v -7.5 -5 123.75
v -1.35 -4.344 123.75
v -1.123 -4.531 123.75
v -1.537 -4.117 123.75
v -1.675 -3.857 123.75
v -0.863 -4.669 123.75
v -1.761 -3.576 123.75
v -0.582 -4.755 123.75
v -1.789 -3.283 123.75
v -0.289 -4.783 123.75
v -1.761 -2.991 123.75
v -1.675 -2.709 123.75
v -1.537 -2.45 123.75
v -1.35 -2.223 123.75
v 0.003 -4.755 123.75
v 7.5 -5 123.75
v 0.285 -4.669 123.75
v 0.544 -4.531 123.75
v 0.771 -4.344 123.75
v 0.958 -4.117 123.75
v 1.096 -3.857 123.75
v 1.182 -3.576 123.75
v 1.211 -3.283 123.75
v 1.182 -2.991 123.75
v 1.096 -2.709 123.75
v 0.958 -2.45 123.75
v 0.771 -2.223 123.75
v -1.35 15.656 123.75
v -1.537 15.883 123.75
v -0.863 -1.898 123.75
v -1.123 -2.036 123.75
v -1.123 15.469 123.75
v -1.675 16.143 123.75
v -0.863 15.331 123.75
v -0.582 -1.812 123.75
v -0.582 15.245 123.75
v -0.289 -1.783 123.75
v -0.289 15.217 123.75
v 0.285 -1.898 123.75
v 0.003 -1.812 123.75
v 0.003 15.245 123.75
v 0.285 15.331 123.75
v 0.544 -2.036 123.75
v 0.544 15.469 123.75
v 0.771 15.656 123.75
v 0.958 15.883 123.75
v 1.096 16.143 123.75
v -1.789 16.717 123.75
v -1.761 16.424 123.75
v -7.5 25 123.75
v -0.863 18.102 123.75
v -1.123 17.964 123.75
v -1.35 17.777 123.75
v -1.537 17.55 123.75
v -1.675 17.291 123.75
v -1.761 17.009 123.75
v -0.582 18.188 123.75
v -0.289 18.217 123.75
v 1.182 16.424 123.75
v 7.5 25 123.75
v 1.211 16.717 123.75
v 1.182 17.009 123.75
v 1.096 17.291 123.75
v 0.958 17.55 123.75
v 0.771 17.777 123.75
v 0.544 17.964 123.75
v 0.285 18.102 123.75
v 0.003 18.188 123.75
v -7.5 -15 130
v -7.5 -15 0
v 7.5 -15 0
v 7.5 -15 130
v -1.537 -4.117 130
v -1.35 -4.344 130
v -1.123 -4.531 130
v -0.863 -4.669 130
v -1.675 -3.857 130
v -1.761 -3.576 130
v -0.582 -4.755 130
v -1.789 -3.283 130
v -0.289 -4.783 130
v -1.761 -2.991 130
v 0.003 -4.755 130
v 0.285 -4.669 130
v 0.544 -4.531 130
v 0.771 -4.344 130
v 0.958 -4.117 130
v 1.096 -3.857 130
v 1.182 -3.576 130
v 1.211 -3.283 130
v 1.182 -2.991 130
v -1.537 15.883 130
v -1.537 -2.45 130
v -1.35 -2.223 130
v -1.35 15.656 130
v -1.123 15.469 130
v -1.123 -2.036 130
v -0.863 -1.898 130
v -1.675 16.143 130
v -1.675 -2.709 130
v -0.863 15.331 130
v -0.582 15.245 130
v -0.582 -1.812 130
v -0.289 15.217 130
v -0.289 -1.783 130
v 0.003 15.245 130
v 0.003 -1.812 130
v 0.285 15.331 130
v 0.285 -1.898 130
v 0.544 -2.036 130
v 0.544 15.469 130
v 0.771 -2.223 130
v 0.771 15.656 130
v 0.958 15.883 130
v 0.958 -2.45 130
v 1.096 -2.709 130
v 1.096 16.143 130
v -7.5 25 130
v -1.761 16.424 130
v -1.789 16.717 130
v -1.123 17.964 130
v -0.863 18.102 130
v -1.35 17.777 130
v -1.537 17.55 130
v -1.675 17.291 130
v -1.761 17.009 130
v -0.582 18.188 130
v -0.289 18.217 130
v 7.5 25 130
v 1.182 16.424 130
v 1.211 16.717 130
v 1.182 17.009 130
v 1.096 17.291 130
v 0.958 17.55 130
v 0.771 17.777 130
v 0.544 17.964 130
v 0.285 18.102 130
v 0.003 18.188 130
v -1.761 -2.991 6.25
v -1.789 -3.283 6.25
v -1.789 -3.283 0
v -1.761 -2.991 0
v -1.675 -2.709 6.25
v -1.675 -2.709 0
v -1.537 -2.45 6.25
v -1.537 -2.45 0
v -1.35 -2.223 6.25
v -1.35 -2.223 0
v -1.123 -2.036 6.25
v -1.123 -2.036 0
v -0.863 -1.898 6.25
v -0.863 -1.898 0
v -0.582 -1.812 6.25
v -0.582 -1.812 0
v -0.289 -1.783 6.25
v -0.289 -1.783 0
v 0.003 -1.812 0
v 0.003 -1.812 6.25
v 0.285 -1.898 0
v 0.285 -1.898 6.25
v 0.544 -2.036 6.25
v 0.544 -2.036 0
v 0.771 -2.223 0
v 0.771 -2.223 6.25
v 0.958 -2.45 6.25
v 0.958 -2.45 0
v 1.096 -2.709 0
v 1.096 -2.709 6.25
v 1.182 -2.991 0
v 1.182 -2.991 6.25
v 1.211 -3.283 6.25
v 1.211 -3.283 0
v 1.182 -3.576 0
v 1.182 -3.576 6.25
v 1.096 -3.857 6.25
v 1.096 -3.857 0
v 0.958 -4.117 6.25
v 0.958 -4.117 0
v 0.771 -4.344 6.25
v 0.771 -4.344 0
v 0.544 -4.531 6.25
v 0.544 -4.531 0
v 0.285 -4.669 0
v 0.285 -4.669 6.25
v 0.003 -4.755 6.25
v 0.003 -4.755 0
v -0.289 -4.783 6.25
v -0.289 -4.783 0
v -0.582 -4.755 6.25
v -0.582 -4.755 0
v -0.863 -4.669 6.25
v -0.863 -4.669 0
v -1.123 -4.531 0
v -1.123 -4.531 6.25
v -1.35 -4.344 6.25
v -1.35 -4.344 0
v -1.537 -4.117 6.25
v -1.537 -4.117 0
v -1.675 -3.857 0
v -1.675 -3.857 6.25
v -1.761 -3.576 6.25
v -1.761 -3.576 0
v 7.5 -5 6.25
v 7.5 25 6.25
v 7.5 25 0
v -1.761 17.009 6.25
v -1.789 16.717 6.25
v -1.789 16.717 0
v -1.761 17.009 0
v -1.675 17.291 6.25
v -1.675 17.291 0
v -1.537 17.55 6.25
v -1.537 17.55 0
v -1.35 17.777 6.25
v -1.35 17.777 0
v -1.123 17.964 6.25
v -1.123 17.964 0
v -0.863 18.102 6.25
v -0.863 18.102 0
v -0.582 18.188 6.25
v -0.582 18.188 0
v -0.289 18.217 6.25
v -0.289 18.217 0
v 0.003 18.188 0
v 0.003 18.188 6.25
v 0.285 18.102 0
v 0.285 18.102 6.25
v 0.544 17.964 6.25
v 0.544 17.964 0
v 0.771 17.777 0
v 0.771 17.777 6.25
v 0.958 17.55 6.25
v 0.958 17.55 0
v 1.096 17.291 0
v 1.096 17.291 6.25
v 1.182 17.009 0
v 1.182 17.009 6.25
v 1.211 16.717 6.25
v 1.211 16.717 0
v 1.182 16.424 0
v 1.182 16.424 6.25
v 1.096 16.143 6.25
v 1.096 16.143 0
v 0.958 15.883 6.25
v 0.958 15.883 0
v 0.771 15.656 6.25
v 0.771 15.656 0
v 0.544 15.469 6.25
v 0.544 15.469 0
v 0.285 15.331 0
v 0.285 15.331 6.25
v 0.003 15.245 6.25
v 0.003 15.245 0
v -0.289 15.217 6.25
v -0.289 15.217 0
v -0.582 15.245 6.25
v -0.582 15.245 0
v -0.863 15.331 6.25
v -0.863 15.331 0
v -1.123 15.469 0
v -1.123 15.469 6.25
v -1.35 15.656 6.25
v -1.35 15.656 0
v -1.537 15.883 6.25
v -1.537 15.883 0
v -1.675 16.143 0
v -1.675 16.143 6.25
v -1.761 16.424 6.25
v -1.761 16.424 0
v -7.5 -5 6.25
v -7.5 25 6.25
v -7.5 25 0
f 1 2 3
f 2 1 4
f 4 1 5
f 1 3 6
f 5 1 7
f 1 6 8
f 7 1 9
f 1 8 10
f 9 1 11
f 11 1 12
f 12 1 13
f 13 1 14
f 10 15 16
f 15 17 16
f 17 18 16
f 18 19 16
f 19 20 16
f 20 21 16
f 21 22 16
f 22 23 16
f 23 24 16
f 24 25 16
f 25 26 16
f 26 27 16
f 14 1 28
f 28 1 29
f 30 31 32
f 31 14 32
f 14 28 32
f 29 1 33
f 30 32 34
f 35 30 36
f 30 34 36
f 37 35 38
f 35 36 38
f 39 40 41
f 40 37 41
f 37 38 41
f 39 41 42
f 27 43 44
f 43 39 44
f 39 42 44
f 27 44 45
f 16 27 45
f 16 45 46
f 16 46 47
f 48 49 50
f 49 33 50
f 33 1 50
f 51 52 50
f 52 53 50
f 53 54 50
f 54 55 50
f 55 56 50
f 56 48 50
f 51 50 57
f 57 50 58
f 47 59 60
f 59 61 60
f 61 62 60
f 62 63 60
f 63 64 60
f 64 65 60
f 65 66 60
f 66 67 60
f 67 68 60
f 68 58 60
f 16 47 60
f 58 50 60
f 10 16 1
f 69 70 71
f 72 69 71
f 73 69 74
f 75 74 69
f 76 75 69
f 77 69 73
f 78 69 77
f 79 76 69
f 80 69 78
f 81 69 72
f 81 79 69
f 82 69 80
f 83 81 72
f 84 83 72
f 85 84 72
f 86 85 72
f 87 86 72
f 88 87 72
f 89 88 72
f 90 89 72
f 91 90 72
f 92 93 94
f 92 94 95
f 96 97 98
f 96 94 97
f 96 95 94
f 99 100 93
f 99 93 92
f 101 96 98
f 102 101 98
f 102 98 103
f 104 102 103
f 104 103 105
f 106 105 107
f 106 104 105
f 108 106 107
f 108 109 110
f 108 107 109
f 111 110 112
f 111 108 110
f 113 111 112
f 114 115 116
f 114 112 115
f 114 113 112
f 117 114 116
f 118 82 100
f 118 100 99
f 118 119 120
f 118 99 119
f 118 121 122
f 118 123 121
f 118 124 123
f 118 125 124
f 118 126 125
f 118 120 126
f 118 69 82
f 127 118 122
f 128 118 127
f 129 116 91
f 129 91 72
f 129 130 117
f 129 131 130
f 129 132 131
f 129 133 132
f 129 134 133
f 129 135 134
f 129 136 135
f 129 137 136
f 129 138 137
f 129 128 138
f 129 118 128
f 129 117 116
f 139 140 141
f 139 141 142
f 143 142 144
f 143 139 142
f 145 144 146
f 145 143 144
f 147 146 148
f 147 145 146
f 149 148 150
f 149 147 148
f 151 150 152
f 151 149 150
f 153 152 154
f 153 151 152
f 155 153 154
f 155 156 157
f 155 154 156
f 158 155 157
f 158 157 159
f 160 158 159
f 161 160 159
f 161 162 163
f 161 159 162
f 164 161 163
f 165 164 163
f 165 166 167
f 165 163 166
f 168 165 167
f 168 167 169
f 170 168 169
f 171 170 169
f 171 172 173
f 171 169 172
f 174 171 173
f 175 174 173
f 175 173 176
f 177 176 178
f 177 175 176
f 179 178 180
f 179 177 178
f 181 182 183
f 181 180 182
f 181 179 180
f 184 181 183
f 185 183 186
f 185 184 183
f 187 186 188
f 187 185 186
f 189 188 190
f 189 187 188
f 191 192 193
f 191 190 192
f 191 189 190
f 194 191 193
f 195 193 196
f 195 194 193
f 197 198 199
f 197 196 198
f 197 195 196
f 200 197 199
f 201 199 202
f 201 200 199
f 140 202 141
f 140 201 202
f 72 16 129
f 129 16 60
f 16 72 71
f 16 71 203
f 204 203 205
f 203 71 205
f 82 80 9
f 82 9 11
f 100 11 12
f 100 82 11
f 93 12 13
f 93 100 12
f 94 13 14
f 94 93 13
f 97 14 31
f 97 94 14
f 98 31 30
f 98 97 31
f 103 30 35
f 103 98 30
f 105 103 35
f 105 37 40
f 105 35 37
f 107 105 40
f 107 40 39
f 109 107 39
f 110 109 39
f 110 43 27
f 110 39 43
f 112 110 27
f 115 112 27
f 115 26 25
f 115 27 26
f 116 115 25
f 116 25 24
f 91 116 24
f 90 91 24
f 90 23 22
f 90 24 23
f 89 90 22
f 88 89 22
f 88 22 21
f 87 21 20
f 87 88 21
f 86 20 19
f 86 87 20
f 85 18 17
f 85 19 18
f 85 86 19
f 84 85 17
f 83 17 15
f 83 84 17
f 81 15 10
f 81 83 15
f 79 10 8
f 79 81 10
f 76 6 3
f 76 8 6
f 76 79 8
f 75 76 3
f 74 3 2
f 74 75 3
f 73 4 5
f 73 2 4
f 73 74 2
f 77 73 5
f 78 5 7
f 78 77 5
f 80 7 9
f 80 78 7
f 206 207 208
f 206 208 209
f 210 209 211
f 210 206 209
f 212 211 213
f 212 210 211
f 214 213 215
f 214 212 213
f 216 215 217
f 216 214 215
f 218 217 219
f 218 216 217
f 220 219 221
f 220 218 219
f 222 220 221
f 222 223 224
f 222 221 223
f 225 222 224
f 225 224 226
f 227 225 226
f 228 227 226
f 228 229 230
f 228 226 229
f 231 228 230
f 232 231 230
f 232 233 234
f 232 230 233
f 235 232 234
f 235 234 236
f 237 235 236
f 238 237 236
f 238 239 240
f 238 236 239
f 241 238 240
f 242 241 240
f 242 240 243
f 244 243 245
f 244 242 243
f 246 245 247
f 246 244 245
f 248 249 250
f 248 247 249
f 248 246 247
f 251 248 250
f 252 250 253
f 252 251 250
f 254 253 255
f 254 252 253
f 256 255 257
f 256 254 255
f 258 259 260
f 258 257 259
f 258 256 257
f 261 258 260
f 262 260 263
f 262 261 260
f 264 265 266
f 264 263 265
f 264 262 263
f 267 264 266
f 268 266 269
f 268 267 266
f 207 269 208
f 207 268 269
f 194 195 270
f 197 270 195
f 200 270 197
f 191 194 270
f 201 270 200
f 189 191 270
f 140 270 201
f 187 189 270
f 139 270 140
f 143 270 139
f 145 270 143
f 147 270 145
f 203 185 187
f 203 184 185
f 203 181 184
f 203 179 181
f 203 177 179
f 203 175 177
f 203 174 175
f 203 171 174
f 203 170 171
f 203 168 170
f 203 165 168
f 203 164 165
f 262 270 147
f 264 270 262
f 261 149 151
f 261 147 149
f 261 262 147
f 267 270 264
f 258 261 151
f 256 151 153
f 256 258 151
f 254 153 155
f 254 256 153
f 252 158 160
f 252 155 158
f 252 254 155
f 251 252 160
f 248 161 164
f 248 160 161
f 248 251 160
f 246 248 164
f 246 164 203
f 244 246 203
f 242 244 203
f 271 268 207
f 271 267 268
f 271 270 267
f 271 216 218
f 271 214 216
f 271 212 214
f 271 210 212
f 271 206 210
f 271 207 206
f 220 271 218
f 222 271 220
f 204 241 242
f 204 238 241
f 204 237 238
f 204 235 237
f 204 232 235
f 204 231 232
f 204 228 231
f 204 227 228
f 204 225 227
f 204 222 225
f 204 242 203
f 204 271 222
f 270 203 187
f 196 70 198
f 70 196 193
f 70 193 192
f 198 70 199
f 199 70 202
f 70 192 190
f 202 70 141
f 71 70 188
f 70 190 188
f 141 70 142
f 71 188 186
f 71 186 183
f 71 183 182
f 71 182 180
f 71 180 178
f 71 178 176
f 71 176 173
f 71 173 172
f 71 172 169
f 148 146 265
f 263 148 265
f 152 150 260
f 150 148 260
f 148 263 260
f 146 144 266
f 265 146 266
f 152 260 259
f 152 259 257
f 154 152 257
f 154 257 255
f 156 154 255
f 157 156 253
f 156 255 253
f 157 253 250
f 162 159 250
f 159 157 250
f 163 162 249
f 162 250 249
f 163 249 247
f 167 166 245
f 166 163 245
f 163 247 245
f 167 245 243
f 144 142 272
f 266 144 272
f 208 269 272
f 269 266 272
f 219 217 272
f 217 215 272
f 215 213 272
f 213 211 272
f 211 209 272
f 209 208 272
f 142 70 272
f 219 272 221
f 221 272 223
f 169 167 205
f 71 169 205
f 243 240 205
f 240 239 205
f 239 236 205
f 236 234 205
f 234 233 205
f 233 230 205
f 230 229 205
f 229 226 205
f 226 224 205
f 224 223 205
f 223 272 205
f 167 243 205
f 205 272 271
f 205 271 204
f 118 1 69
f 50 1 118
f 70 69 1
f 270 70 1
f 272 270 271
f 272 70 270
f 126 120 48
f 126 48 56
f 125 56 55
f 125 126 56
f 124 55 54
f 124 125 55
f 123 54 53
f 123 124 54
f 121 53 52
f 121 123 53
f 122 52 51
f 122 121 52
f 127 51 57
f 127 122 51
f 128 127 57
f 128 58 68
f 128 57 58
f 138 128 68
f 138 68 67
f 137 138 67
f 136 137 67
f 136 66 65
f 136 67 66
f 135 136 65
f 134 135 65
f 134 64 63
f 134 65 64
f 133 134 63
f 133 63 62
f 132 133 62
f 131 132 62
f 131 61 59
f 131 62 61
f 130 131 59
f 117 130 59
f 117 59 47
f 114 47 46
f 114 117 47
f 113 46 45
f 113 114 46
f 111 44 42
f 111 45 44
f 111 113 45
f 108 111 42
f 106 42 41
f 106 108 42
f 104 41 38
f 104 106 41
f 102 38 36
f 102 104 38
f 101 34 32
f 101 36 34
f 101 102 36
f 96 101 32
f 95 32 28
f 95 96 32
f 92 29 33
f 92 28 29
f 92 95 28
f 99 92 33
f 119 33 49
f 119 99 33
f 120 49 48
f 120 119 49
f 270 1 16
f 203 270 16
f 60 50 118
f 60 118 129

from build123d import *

# Parameters (mm, degrees)
SKETCH1_W               = 15
SKETCH1_H               = 40
BOSS_EXTRUDE1_DEPTH     = 130
SKETCH2_W               = 15
SKETCH2_H               = 117.5
CUT_EXTRUDE1_DEPTH      = 30
CUT_EXTRUDE2_DEPTH      = 133.594306062
CUT_EXTRUDE2_DEPTH_BACK = 133.594306062
SKETCH3_R               = 1.5


with BuildPart() as part:
    # Sketch1 → Boss-Extrude1 (new body)
    with BuildSketch(Plane.XY):
        with Locations((0, 5)):
            Rectangle(SKETCH1_W, SKETCH1_H)
    extrude(amount=BOSS_EXTRUDE1_DEPTH)

    # Sketch2 → Cut-Extrude1 (cut)
    with BuildSketch(Plane(origin=(0, 25, 0), x_dir=(1, 0, 0), z_dir=(0, 1, 0))):
        with Locations((0, -65)):
            Rectangle(SKETCH2_W, SKETCH2_H)
    extrude(amount=-CUT_EXTRUDE1_DEPTH, mode=Mode.SUBTRACT)

    # Sketch3 → Cut-Extrude2 (cut, two sides: drawn at the far end of the back side and taken through both)
    with BuildSketch(Plane(origin=(0, 0, 0), x_dir=(-1, 0, 0), z_dir=(0, 0, -1)).offset(-CUT_EXTRUDE2_DEPTH_BACK)):
        with Locations((0.28935703, 16.716588701)):
            Circle(SKETCH3_R)
        with Locations((0.28935703, -3.283411299)):
            Circle(SKETCH3_R)
    extrude(amount=CUT_EXTRUDE2_DEPTH + CUT_EXTRUDE2_DEPTH_BACK, mode=Mode.SUBTRACT)


solid = part.part
